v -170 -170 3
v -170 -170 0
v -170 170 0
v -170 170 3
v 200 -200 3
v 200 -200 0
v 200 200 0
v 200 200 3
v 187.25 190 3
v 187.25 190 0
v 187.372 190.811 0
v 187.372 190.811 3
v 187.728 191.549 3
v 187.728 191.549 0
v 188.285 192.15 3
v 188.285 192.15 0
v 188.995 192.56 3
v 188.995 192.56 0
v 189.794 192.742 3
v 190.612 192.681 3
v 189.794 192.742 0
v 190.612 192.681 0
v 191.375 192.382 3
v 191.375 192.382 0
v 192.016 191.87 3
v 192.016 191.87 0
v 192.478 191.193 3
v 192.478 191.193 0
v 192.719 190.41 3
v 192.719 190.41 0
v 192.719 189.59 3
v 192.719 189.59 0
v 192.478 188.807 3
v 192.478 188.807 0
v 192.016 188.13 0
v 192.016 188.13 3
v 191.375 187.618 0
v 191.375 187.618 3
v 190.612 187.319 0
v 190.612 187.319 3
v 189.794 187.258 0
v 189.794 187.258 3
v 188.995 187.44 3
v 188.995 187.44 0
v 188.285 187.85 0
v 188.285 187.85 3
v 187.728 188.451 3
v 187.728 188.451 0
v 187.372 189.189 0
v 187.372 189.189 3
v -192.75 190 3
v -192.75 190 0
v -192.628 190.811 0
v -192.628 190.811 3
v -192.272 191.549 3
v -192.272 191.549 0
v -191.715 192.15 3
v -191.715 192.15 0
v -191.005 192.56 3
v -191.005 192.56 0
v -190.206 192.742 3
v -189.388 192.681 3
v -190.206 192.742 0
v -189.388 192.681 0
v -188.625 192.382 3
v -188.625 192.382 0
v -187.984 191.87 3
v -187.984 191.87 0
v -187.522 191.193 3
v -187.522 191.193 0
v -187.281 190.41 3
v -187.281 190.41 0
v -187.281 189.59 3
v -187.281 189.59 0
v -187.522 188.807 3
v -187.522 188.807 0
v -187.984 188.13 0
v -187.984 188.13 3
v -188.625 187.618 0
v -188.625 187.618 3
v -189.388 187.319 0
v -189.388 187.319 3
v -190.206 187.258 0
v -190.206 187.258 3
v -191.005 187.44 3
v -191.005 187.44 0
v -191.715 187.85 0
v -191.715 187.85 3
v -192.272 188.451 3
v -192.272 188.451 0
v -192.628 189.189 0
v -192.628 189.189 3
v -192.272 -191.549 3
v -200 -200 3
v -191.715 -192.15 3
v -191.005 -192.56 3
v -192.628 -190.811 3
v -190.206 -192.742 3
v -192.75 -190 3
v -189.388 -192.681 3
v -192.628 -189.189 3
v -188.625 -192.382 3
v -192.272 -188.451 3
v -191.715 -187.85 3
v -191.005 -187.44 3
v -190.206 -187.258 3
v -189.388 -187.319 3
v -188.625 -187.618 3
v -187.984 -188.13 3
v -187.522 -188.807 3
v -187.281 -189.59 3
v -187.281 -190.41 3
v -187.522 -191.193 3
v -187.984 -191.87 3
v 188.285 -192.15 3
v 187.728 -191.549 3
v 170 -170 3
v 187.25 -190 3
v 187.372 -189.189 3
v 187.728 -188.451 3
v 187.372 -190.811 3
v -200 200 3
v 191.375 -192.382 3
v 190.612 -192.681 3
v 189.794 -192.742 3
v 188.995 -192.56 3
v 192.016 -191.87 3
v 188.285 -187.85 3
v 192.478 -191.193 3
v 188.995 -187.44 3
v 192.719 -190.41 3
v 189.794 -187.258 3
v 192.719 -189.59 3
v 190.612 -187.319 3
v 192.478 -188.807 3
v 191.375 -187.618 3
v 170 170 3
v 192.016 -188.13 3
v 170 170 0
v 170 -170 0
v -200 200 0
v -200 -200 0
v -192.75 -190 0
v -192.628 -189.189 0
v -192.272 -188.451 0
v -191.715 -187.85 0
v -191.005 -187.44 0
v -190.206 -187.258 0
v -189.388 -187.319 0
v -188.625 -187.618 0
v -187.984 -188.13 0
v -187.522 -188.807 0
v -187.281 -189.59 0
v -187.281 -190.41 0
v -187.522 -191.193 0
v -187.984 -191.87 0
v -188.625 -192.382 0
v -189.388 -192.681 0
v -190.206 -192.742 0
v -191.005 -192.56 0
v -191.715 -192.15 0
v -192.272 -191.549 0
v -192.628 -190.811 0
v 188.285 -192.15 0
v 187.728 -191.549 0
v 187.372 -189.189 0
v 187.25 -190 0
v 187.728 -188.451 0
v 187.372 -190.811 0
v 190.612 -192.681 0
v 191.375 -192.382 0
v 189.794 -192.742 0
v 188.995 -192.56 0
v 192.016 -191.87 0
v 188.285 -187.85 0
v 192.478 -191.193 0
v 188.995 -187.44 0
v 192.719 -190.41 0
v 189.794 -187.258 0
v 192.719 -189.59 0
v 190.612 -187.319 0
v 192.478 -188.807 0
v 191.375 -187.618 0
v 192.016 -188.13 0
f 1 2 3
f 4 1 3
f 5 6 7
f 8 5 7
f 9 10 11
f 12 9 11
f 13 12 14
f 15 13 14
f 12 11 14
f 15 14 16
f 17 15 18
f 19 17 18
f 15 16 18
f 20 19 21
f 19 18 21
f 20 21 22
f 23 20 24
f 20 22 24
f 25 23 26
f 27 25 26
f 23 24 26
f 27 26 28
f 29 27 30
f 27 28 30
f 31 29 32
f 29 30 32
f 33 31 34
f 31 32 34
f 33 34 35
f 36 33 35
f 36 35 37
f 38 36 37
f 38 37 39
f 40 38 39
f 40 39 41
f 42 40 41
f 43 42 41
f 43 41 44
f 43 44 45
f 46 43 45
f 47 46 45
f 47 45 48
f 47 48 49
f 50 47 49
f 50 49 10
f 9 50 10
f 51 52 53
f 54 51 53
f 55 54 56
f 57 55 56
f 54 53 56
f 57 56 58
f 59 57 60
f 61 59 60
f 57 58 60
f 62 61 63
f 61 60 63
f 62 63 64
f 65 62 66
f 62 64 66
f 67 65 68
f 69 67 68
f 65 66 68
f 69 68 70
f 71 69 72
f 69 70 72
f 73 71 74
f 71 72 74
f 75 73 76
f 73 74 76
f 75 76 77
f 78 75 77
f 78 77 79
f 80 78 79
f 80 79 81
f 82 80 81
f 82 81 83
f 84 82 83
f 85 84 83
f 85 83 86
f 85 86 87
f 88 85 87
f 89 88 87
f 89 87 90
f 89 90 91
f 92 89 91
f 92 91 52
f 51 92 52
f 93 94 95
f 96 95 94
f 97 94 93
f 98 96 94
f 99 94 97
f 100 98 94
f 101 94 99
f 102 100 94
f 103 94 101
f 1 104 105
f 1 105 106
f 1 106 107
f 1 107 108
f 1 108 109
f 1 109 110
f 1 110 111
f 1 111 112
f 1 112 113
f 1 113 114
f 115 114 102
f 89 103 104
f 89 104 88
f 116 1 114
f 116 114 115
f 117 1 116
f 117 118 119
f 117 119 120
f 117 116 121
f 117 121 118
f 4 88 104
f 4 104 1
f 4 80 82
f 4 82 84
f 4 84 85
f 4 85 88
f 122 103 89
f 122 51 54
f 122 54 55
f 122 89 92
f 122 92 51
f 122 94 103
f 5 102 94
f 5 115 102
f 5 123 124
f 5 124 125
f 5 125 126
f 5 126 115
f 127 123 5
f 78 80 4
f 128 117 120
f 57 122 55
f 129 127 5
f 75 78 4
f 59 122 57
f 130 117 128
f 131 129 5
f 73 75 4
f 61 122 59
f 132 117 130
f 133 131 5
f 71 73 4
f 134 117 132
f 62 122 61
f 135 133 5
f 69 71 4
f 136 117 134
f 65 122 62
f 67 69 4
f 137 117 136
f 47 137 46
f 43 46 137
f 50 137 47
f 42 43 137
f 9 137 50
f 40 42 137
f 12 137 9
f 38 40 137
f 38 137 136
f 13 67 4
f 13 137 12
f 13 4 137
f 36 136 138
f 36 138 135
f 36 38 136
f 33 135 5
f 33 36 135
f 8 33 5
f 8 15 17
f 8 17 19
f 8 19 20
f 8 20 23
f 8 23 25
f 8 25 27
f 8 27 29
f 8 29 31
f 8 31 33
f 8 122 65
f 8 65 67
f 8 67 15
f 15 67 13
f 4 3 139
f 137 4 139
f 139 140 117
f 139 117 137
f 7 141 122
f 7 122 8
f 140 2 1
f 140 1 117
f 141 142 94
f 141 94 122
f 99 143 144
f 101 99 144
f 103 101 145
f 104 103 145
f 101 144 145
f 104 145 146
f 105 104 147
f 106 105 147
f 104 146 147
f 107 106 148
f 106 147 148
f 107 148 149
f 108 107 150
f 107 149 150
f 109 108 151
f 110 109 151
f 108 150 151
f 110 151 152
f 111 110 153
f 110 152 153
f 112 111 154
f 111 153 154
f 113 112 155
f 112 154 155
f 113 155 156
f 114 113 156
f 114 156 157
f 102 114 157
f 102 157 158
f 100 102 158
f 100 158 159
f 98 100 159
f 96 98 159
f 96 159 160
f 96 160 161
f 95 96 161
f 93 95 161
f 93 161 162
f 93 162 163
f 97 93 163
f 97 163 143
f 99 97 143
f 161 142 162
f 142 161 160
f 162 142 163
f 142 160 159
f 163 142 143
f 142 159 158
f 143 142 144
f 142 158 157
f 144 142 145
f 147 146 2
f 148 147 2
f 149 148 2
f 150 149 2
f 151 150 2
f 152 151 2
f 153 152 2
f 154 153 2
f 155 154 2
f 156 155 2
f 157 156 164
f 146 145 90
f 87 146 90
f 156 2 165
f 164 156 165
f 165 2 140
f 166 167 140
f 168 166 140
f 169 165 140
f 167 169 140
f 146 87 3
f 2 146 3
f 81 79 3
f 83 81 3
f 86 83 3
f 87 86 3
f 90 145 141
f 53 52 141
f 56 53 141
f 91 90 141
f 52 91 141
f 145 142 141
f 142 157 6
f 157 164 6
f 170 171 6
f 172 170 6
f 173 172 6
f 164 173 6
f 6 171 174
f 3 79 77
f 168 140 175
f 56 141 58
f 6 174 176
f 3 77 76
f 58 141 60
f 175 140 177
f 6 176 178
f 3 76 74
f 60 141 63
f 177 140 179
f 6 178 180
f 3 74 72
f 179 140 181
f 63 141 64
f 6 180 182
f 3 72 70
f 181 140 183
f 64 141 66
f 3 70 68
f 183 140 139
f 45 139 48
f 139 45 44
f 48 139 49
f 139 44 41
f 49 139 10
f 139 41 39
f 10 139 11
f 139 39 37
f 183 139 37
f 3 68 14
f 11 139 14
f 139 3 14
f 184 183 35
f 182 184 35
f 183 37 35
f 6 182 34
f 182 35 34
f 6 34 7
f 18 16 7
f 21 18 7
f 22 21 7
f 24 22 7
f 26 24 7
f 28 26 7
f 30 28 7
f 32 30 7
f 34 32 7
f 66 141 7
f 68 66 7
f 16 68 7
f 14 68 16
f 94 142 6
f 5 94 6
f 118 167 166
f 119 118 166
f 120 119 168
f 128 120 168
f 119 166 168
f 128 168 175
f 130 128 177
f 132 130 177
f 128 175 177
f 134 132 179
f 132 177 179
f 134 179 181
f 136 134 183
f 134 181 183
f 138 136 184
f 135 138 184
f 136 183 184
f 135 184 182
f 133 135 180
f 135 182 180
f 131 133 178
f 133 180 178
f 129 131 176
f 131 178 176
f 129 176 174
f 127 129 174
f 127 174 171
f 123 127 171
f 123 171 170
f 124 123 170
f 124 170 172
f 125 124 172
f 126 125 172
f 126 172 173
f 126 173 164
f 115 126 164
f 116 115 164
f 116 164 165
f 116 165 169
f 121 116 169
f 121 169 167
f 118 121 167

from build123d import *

# Parameters (mm, degrees)
ESQUISSE1_W        = 400
ESQUISSE1_H        = 400
ESQUISSE1_W_2      = 340
ESQUISSE1_H_2      = 340
BOSS_EXTRU_1_DEPTH = 3
D_GAGEMENT_M51_D   = 5.5


with BuildPart() as part:
    # Esquisse1 → Boss.-Extru.1 (new body)
    with BuildSketch(Plane.XY):
        Rectangle(ESQUISSE1_W, ESQUISSE1_H)
        Rectangle(ESQUISSE1_W_2, ESQUISSE1_H_2, mode=Mode.SUBTRACT)
    extrude(amount=BOSS_EXTRU_1_DEPTH)

    # Dégagement M51 (through all)
    with Locations(Plane.XY.offset(3)):
        with Locations((-190, -190), (-190, 190), (190, 190), (190, -190)):
            Hole(D_GAGEMENT_M51_D / 2)


solid = part.part
